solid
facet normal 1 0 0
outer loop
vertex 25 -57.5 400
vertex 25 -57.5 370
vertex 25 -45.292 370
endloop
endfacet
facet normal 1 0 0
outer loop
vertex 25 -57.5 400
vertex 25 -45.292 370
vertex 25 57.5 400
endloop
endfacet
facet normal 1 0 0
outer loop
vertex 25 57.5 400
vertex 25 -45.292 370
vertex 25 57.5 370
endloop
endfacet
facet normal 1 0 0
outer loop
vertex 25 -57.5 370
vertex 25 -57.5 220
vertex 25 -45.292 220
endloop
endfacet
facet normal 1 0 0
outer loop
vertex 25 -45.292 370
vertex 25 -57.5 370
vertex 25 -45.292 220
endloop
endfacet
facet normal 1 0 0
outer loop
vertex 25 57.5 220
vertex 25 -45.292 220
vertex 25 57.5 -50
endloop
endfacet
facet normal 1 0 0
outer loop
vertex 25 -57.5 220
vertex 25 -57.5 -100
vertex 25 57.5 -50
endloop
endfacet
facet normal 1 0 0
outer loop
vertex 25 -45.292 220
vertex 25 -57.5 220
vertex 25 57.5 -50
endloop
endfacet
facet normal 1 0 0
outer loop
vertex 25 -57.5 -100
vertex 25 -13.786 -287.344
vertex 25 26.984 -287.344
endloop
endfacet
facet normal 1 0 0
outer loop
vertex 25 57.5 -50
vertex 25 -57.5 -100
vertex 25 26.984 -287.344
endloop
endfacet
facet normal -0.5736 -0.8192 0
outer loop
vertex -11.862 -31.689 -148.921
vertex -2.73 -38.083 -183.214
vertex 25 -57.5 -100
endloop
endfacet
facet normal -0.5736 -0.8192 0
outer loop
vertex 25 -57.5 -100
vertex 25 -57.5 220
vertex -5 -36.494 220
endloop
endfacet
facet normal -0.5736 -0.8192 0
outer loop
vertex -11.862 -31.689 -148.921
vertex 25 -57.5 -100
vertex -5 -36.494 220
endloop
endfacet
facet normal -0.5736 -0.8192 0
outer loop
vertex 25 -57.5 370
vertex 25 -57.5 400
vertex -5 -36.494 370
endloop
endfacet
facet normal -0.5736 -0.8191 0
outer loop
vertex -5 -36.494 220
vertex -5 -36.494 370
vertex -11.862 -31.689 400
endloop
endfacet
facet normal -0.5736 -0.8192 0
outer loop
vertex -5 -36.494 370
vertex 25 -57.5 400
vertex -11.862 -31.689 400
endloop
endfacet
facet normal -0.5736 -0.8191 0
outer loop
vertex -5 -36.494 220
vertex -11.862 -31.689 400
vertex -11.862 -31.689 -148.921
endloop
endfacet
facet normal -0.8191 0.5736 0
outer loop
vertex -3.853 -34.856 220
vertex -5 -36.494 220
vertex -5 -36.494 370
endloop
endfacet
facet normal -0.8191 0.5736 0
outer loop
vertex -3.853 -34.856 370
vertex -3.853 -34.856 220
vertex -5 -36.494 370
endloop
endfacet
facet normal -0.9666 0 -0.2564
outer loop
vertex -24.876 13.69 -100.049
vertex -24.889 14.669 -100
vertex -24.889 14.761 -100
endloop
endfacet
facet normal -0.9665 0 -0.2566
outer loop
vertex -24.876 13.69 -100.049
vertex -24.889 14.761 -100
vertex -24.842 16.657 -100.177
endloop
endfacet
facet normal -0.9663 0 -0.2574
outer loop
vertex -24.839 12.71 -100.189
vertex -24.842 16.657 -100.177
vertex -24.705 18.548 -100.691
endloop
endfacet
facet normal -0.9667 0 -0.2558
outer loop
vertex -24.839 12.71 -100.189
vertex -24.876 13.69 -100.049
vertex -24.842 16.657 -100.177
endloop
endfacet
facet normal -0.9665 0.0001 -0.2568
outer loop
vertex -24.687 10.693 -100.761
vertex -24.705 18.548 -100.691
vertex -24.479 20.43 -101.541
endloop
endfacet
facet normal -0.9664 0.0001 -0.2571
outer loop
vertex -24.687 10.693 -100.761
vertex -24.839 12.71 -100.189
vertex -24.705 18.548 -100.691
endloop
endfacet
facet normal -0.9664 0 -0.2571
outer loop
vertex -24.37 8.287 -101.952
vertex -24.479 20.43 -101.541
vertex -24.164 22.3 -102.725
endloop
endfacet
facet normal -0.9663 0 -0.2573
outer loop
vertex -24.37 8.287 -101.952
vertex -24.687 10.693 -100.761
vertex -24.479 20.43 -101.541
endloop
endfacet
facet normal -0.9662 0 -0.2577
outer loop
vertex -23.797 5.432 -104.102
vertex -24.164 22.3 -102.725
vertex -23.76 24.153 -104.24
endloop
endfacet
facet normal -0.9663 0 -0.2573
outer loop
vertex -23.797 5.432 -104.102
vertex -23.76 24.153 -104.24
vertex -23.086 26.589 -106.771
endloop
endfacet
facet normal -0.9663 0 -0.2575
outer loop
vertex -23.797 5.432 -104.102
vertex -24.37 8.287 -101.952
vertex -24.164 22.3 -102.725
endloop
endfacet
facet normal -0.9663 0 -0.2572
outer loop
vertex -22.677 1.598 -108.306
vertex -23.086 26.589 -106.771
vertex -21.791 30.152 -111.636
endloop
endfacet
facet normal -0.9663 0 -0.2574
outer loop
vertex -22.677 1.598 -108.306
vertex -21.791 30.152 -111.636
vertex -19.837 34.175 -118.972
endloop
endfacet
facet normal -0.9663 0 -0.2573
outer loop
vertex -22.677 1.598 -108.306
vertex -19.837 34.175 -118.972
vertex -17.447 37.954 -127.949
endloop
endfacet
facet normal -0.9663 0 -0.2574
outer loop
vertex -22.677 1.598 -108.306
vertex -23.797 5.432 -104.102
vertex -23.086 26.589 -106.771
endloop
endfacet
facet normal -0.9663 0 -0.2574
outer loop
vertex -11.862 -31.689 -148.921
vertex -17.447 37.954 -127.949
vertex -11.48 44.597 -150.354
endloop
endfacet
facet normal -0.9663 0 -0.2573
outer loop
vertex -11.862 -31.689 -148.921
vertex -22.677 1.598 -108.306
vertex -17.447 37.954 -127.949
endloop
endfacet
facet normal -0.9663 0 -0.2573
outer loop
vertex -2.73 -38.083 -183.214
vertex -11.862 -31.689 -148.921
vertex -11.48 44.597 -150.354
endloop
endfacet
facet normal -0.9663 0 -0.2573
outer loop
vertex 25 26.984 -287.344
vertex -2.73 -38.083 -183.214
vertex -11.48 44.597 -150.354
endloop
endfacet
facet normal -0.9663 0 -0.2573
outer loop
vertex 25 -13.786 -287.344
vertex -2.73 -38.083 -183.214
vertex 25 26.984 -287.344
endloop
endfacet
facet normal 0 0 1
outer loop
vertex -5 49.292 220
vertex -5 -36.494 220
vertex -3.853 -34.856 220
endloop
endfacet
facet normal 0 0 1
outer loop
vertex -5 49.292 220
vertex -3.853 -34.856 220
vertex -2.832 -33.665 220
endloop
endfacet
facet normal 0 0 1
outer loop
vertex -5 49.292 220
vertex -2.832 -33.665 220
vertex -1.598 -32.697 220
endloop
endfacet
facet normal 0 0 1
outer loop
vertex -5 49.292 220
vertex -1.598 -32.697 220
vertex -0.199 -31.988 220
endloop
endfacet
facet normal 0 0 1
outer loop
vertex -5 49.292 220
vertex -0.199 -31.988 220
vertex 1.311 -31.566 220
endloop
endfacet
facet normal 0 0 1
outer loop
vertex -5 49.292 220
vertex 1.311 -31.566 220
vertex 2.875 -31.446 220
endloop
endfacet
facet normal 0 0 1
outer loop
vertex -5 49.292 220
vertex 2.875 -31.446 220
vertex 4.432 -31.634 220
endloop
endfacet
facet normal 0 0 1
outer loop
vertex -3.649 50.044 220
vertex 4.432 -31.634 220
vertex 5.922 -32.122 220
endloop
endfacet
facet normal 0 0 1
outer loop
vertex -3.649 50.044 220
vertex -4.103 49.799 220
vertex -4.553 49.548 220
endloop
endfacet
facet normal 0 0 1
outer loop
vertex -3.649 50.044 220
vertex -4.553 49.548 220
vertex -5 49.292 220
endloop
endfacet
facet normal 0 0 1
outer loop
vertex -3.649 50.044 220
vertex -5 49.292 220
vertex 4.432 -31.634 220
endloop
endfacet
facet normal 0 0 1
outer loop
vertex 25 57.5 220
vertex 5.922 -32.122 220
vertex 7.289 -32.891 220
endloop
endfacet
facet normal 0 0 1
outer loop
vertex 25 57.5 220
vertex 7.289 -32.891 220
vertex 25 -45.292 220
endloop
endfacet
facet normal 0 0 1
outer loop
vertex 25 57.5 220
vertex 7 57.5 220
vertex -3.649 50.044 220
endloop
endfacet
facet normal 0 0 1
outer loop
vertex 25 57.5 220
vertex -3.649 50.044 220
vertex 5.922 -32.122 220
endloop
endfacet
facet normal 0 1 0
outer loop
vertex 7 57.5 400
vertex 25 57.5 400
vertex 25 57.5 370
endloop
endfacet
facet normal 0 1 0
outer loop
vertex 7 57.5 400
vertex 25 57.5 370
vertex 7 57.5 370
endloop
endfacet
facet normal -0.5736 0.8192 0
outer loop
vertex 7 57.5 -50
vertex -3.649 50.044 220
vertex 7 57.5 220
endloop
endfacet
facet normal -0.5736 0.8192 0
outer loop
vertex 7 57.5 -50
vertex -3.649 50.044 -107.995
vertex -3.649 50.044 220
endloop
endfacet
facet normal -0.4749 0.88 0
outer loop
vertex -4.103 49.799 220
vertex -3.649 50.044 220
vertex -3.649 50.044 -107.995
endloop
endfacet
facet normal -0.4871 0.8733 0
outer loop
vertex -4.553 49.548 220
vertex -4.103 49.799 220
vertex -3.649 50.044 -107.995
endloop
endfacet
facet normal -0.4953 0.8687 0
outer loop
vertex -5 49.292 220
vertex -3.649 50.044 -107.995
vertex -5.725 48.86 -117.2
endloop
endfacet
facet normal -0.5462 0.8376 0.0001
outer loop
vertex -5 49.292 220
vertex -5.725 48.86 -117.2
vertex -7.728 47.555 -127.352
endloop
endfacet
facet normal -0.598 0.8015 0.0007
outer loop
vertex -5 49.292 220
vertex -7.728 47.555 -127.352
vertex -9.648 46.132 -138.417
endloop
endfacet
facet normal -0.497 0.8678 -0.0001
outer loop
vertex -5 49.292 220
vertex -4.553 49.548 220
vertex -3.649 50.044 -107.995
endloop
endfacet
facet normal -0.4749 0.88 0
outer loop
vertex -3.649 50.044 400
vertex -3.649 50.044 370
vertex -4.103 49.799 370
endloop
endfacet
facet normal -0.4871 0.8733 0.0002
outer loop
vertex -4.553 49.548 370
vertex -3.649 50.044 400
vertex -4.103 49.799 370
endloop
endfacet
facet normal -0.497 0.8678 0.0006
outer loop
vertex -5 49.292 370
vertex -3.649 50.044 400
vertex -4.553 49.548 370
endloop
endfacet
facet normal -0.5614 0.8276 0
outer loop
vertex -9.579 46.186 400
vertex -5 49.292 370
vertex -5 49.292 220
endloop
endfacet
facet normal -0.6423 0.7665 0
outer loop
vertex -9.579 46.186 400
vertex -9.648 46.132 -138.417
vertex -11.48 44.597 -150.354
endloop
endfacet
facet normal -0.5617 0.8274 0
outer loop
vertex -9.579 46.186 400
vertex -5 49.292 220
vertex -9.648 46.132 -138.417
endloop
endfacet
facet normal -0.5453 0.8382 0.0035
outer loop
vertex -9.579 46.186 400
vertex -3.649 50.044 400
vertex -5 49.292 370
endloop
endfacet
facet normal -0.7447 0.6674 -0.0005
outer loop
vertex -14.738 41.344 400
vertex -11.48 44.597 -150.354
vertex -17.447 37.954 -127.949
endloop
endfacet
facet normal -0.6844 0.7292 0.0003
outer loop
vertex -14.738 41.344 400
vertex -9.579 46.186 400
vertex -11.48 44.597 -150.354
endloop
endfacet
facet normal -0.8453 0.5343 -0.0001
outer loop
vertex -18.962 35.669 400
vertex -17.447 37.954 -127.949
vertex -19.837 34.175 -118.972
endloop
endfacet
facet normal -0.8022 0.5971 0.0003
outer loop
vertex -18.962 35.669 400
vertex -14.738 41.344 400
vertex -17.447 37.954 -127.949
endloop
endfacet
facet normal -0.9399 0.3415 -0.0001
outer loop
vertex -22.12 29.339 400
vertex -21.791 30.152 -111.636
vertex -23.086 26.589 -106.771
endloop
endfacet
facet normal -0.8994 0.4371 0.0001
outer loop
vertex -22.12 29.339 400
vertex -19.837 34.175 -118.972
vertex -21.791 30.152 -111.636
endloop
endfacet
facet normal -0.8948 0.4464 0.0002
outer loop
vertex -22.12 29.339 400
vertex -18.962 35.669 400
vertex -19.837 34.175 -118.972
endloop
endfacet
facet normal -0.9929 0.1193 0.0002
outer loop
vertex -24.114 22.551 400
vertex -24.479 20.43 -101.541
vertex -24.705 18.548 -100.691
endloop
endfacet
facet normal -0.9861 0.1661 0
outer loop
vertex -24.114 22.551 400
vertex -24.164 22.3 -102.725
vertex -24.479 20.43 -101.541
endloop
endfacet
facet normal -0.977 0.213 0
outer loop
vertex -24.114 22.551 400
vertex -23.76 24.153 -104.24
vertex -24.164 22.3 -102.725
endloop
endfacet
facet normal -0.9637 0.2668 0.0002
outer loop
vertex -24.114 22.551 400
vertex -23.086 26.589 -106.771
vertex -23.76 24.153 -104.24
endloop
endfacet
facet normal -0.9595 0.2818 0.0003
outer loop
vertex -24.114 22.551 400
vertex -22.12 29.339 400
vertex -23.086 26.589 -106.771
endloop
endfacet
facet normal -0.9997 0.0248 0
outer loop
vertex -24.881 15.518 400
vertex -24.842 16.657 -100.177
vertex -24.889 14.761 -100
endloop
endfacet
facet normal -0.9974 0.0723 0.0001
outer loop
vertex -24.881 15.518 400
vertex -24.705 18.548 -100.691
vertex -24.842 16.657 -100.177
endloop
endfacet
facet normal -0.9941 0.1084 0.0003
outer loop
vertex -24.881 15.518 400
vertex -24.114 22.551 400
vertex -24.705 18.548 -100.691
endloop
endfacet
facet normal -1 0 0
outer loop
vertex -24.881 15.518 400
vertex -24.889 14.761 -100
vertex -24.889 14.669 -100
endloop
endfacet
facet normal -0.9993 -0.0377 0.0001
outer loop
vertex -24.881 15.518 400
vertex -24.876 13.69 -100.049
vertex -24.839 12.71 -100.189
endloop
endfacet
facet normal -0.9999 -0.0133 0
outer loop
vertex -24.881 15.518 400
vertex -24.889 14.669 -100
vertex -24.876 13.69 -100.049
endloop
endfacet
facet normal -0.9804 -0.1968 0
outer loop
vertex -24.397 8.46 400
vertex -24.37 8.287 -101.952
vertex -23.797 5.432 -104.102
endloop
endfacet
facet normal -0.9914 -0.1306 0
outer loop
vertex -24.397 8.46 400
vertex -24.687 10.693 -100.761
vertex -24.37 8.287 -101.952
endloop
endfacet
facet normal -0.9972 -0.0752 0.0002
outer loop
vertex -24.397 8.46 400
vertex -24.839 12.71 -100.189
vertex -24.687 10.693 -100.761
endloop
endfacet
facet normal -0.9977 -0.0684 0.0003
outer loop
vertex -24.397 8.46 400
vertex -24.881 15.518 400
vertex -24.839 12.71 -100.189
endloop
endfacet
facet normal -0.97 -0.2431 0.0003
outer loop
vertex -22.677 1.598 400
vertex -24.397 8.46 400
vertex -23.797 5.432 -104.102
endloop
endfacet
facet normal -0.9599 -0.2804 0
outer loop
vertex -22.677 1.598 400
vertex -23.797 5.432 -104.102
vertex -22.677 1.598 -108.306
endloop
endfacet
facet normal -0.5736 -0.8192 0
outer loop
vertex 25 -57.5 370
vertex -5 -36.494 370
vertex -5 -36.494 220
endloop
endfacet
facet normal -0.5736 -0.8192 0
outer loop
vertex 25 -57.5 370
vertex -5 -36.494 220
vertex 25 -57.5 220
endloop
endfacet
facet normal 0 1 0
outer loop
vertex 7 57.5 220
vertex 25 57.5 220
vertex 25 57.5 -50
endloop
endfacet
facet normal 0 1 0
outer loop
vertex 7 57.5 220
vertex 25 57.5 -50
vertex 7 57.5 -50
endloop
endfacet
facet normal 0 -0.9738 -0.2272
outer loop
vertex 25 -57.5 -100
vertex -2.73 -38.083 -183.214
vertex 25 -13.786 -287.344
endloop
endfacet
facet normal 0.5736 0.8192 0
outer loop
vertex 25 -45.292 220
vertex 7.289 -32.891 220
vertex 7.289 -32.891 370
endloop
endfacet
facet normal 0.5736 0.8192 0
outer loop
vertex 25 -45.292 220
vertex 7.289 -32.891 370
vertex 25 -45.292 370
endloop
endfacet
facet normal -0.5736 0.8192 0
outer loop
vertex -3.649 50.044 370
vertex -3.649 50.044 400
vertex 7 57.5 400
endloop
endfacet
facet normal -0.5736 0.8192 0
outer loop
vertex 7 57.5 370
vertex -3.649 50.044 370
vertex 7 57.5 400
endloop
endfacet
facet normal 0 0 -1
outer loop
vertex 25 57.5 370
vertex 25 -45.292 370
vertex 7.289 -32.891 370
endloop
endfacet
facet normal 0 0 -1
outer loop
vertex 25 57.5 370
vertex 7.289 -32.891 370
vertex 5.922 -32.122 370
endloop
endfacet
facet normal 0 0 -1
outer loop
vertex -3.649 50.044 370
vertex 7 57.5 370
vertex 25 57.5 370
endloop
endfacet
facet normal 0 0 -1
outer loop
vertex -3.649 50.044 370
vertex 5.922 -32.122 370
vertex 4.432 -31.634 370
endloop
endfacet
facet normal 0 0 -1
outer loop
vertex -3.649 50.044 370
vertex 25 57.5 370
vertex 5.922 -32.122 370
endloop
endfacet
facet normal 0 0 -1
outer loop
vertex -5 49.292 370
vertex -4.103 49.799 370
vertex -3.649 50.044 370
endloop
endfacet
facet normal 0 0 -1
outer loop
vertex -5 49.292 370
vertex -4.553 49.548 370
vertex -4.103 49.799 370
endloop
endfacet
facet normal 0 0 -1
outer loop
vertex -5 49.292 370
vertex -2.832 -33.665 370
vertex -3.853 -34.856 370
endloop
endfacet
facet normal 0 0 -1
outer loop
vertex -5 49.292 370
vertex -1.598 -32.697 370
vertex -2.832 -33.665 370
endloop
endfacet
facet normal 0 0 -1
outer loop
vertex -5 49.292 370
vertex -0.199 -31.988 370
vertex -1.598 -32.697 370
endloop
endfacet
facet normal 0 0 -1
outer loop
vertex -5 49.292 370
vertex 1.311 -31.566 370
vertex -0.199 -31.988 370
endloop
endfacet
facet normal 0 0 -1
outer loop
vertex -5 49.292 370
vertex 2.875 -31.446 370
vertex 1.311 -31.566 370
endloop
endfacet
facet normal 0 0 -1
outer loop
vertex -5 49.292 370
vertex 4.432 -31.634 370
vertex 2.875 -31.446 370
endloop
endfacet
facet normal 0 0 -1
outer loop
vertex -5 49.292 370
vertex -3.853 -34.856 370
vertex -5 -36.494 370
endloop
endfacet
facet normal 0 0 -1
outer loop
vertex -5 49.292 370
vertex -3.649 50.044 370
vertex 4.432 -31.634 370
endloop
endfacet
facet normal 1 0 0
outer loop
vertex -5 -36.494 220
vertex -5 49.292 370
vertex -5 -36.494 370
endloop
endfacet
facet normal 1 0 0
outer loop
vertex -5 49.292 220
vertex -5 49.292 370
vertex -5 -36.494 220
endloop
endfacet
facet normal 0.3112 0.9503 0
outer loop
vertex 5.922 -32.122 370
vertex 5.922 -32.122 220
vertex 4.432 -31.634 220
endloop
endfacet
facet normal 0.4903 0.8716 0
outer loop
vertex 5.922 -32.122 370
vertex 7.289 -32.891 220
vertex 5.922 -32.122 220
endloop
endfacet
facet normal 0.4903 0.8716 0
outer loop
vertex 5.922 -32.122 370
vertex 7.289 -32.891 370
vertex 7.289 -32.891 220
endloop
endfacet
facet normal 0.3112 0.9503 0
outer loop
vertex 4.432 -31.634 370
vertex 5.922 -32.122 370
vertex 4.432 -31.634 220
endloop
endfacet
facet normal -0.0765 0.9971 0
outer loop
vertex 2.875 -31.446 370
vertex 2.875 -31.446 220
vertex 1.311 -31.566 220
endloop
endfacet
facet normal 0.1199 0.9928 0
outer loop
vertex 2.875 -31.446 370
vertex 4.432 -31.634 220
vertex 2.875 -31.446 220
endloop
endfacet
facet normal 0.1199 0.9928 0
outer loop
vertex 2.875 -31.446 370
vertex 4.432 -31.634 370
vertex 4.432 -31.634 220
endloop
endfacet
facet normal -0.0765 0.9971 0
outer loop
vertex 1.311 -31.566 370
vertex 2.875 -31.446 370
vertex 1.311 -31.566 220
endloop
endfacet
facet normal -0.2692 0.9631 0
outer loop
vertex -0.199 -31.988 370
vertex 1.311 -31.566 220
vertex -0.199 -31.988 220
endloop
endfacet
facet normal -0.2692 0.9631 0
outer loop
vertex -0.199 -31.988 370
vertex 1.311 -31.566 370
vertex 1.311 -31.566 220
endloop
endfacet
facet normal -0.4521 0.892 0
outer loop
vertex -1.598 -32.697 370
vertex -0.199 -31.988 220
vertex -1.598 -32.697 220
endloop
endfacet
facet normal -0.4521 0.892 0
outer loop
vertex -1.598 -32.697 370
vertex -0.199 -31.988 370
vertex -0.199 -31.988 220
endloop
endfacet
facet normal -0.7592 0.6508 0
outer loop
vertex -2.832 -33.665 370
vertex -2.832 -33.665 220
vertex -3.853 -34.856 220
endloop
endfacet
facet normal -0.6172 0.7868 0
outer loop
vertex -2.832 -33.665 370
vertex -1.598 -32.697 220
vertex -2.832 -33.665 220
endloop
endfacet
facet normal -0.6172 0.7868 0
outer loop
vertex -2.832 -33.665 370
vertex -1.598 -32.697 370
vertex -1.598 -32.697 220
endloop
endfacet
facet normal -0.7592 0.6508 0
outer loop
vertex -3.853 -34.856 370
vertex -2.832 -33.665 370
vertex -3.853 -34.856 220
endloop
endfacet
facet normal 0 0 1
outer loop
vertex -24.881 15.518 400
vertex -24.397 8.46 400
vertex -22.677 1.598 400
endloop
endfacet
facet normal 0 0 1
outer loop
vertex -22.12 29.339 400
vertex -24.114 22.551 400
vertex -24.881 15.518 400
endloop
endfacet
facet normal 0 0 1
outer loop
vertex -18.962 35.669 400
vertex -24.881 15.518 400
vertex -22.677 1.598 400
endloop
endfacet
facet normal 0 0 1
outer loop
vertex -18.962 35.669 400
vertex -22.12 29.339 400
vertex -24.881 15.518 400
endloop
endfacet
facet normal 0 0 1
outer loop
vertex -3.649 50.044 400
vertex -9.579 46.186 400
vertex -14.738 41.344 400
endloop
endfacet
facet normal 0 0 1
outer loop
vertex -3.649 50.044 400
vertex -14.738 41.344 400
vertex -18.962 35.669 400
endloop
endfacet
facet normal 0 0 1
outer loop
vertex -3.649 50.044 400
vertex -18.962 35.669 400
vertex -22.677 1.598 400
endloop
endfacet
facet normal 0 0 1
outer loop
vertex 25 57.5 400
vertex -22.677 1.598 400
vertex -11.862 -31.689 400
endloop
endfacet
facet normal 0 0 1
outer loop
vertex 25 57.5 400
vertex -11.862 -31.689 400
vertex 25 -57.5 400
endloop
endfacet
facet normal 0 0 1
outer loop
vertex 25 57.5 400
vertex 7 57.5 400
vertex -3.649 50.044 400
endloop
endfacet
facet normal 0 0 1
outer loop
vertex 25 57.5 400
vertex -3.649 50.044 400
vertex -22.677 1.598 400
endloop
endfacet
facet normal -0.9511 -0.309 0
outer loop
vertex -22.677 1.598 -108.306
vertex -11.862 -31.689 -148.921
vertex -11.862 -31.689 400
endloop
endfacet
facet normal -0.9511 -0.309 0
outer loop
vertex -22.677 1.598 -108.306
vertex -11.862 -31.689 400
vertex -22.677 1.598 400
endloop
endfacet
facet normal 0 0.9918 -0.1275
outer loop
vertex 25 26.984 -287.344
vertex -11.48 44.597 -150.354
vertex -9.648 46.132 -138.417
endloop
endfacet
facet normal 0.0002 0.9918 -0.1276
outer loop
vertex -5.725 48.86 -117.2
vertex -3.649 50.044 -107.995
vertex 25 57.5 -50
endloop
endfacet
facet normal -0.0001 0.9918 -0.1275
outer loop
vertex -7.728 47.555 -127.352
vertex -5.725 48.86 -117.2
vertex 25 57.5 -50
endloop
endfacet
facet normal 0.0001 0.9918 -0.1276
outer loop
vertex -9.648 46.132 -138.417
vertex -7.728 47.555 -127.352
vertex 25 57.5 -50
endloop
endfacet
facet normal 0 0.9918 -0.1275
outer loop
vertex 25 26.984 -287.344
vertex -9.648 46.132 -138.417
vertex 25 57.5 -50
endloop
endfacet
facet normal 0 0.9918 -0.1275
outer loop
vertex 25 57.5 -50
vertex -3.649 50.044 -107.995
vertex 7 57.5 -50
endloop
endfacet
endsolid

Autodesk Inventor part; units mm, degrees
ref_plane "YZ Plane" through (0, 0, 0) normal (1, 0, 0) x (0, 1, 0)
ref_plane "XZ Plane" through (0, 0, 0) normal (0, 1, 0) x (-1, 0, 0)
ref_plane "XY Plane" through (0, 0, 0) normal (0, 0, 1) x (1, 0, 0)
sketch "Sketch1" plane through (0, 0, 0) normal (0, 0, 1) x (1, 0, 0)
  line L0 (-25, -57.5) -> (25, -57.5)
  line L1 (25, -57.5) -> (25, 57.5)
  line L2 (25, 57.5) -> (-25, 57.5)
  line L3 (-25, 57.5) -> (-25, -57.5)
  line L4 (-25, -57.5) -> (25, 57.5) construction
  line L5 (25, -57.5) -> (-25, 57.5) construction
  point P0 (0, 0)
  dimension "d0" = 50
  dimension "d1" = 115
extrude "Extrusion1" add sketch "Sketch1" along normal mid plane 800
sketch "Sketch2" plane through (0, 0, 400) normal (0, 0, 1) x (1, 0, 0)
  line L0 (-25, -57.5) -> (25, -57.5) projected
  line L1 (25, -57.5) -> (25, 57.5) construction
  line L2 (25, 57.5) -> (-25, 57.5) projected
  line L3 (-25, 57.5) -> (-25, -57.5) projected
  line L4 (25, -57.5) -> (86.0387, -57.5) construction
  line L5 (-25, -57.5) -> (25, -57.5) projected
  line L6 (25, -57.5) -> (-11.8618, -31.6891)
  line L7 (25, -57.5) -> (70, -57.5) construction
  line L8 (-11.8618, -31.6891) -> (-22.6774, 1.5979)
  line L9 (-11.8618, -31.6891) -> (23.1382, -31.6891) construction
  arc A0 (-3.649, 50.0435) -> (-22.6774, 1.5979) centre (15.1106, 14.7153) ccw
  line L10 (-3.649, 50.0435) -> (7, 57.5)
  line L11 (-3.649, 50.0435) -> (9.351, 50.0435) construction
  line L12 (25, 57.5) -> (-25, 57.5) projected
  point P0 (0, 0)
  dimension "d5" = 45
  dimension "d6" = 145
  dimension "d7" = 35
  dimension "d8" = 108
  dimension "d9" = 40
  dimension "d10" = 13
  dimension "d11" = 35
  dimension "d12" = 18
extrude "Extrusion2" cut sketch "Sketch2" against normal through all
sketch "Sketch3" plane through (0, 0, 0) normal (1, 0, 0) x (0, 1, 0)
  line L0 (57.5, -400) -> (57.5, 400) projected
  line L1 (-57.5, 400) -> (57.5, 400) projected
  line L2 (-57.5, -400) -> (-57.5, 400) projected
  line L3 (57.5, -400) -> (-57.5, -400) projected
  line L4 (-57.5, -400) -> (-57.5, 400) projected
  line L5 (-57.5, -100) -> (12.5, -400)
  line L6 (57.5, -400) -> (-57.5, -400) projected
  point P0 (0, 0)
  dimension "d15" = 300
  dimension "d16" = 70
extrude "Extrusion3" cut sketch "Sketch3" along normal through all both and the other way through all contours L3 L2 L5
sketch "Sketch4" plane through (25, 57.5, 400) normal (1, 0, 0) x (0, 0, -1)
  line L0 (500, -115) -> (800, -45) projected
  line L1 (800, 0) -> (800, -45) projected
  line L2 (800, 0) -> (0, 0) projected
  line L3 (0, -115) -> (0, 0) projected
  line L4 (500, -115) -> (0, -115) projected
  line L5 (800, -45) -> (450, 0)
  point P0 (400, -57.5)
  dimension "d19" = 350
extrude "Extrusion4" cut sketch "Sketch4" along normal through all both and the other way through all contours L5 L2 L1
sketch "Sketch5" plane through (0, 0, 0) normal (0, 1, 0) x (-1, 0, 0)
  line L0 (-25, -100) -> (-25, -400) projected
  line L1 (24.8894, -382.7696) -> (24.8894, 400) projected
  line L2 (-25, -400) -> (24.8894, -400)
  line L3 (24.8894, -400) -> (24.8894, 400)
  line L4 (-25, 400) -> (-25, -400)
  line L5 (-7, 400) -> (3.649, 400) projected
  line L6 (24.8894, -100) -> (-55, -400)
  line L7 (-55, -400) -> (-25, -400)
  point P0 (0, 0)
  point P1 (-0.0553, 400)
  dimension "d22" = 30
  dimension "d23" = 300
extrude "Extrusion5" cut sketch "Sketch5" along normal through all both and the other way through all
sketch "Sketch6" plane through (7, 57.5, 400) normal (0, 1, 0) x (1, 0, 0)
  line L0 (18, 500) -> (18, 0) projected
  line L1 (18, 30) -> (-12, 30)
  line L2 (-12, 30) -> (-12, 180)
  line L3 (-12, 180) -> (18, 180)
  line L4 (18, 180) -> (18, 30)
  line L5 (18, 0) -> (0, 0) projected
  point P0 (-7, 400)
  dimension "d26" = 30
  dimension "d27" = 150
  dimension "d28" = 30
extrude "Extrusion6" cut sketch "Sketch6" against normal through all
sketch "Sketch7" plane through (-11.8618, -31.6891, -148.9211) normal (-0.5735764, -0.819152, 0) x (0.819152, -0.5735764, 0)
  line L0 (-40.8281, 518.9211) -> (8.3768, 518.9211) projected
  line L1 (-20.9613, 368.9211) -> (45, 368.9211) projected
  line L2 (8.3768, 518.9211) -> (45, 518.9211)
  line L3 (45, 518.9211) -> (45, 368.9211)
  line L4 (45, 368.9211) -> (8.3768, 368.9211)
  line L5 (8.3768, 368.9211) -> (8.3768, 518.9211)
  point P0 (-8.4594, 148.9211)
extrude "Extrusion7" add sketch "Sketch7" against normal blind 10
fillet "Fillet1" radius 8 1 edges at (0.7358, -28.3023, 295)
sketch "Sketch8" plane through (25, -57.5, 370) normal (0, 0, 1) x (1, 0, 0)
  line L0 (0, 0) -> (0, 12.2077) projected
  line L1 (0, 0) -> (5.7358, 8.1915) projected
  line L2 (0, 12.2077) -> (5.7358, 8.1915) projected
  point P0 (-25, 57.5)
extrude "Extrusion8" cut sketch "Sketch8" against normal through all
properties part number "bodyside"
